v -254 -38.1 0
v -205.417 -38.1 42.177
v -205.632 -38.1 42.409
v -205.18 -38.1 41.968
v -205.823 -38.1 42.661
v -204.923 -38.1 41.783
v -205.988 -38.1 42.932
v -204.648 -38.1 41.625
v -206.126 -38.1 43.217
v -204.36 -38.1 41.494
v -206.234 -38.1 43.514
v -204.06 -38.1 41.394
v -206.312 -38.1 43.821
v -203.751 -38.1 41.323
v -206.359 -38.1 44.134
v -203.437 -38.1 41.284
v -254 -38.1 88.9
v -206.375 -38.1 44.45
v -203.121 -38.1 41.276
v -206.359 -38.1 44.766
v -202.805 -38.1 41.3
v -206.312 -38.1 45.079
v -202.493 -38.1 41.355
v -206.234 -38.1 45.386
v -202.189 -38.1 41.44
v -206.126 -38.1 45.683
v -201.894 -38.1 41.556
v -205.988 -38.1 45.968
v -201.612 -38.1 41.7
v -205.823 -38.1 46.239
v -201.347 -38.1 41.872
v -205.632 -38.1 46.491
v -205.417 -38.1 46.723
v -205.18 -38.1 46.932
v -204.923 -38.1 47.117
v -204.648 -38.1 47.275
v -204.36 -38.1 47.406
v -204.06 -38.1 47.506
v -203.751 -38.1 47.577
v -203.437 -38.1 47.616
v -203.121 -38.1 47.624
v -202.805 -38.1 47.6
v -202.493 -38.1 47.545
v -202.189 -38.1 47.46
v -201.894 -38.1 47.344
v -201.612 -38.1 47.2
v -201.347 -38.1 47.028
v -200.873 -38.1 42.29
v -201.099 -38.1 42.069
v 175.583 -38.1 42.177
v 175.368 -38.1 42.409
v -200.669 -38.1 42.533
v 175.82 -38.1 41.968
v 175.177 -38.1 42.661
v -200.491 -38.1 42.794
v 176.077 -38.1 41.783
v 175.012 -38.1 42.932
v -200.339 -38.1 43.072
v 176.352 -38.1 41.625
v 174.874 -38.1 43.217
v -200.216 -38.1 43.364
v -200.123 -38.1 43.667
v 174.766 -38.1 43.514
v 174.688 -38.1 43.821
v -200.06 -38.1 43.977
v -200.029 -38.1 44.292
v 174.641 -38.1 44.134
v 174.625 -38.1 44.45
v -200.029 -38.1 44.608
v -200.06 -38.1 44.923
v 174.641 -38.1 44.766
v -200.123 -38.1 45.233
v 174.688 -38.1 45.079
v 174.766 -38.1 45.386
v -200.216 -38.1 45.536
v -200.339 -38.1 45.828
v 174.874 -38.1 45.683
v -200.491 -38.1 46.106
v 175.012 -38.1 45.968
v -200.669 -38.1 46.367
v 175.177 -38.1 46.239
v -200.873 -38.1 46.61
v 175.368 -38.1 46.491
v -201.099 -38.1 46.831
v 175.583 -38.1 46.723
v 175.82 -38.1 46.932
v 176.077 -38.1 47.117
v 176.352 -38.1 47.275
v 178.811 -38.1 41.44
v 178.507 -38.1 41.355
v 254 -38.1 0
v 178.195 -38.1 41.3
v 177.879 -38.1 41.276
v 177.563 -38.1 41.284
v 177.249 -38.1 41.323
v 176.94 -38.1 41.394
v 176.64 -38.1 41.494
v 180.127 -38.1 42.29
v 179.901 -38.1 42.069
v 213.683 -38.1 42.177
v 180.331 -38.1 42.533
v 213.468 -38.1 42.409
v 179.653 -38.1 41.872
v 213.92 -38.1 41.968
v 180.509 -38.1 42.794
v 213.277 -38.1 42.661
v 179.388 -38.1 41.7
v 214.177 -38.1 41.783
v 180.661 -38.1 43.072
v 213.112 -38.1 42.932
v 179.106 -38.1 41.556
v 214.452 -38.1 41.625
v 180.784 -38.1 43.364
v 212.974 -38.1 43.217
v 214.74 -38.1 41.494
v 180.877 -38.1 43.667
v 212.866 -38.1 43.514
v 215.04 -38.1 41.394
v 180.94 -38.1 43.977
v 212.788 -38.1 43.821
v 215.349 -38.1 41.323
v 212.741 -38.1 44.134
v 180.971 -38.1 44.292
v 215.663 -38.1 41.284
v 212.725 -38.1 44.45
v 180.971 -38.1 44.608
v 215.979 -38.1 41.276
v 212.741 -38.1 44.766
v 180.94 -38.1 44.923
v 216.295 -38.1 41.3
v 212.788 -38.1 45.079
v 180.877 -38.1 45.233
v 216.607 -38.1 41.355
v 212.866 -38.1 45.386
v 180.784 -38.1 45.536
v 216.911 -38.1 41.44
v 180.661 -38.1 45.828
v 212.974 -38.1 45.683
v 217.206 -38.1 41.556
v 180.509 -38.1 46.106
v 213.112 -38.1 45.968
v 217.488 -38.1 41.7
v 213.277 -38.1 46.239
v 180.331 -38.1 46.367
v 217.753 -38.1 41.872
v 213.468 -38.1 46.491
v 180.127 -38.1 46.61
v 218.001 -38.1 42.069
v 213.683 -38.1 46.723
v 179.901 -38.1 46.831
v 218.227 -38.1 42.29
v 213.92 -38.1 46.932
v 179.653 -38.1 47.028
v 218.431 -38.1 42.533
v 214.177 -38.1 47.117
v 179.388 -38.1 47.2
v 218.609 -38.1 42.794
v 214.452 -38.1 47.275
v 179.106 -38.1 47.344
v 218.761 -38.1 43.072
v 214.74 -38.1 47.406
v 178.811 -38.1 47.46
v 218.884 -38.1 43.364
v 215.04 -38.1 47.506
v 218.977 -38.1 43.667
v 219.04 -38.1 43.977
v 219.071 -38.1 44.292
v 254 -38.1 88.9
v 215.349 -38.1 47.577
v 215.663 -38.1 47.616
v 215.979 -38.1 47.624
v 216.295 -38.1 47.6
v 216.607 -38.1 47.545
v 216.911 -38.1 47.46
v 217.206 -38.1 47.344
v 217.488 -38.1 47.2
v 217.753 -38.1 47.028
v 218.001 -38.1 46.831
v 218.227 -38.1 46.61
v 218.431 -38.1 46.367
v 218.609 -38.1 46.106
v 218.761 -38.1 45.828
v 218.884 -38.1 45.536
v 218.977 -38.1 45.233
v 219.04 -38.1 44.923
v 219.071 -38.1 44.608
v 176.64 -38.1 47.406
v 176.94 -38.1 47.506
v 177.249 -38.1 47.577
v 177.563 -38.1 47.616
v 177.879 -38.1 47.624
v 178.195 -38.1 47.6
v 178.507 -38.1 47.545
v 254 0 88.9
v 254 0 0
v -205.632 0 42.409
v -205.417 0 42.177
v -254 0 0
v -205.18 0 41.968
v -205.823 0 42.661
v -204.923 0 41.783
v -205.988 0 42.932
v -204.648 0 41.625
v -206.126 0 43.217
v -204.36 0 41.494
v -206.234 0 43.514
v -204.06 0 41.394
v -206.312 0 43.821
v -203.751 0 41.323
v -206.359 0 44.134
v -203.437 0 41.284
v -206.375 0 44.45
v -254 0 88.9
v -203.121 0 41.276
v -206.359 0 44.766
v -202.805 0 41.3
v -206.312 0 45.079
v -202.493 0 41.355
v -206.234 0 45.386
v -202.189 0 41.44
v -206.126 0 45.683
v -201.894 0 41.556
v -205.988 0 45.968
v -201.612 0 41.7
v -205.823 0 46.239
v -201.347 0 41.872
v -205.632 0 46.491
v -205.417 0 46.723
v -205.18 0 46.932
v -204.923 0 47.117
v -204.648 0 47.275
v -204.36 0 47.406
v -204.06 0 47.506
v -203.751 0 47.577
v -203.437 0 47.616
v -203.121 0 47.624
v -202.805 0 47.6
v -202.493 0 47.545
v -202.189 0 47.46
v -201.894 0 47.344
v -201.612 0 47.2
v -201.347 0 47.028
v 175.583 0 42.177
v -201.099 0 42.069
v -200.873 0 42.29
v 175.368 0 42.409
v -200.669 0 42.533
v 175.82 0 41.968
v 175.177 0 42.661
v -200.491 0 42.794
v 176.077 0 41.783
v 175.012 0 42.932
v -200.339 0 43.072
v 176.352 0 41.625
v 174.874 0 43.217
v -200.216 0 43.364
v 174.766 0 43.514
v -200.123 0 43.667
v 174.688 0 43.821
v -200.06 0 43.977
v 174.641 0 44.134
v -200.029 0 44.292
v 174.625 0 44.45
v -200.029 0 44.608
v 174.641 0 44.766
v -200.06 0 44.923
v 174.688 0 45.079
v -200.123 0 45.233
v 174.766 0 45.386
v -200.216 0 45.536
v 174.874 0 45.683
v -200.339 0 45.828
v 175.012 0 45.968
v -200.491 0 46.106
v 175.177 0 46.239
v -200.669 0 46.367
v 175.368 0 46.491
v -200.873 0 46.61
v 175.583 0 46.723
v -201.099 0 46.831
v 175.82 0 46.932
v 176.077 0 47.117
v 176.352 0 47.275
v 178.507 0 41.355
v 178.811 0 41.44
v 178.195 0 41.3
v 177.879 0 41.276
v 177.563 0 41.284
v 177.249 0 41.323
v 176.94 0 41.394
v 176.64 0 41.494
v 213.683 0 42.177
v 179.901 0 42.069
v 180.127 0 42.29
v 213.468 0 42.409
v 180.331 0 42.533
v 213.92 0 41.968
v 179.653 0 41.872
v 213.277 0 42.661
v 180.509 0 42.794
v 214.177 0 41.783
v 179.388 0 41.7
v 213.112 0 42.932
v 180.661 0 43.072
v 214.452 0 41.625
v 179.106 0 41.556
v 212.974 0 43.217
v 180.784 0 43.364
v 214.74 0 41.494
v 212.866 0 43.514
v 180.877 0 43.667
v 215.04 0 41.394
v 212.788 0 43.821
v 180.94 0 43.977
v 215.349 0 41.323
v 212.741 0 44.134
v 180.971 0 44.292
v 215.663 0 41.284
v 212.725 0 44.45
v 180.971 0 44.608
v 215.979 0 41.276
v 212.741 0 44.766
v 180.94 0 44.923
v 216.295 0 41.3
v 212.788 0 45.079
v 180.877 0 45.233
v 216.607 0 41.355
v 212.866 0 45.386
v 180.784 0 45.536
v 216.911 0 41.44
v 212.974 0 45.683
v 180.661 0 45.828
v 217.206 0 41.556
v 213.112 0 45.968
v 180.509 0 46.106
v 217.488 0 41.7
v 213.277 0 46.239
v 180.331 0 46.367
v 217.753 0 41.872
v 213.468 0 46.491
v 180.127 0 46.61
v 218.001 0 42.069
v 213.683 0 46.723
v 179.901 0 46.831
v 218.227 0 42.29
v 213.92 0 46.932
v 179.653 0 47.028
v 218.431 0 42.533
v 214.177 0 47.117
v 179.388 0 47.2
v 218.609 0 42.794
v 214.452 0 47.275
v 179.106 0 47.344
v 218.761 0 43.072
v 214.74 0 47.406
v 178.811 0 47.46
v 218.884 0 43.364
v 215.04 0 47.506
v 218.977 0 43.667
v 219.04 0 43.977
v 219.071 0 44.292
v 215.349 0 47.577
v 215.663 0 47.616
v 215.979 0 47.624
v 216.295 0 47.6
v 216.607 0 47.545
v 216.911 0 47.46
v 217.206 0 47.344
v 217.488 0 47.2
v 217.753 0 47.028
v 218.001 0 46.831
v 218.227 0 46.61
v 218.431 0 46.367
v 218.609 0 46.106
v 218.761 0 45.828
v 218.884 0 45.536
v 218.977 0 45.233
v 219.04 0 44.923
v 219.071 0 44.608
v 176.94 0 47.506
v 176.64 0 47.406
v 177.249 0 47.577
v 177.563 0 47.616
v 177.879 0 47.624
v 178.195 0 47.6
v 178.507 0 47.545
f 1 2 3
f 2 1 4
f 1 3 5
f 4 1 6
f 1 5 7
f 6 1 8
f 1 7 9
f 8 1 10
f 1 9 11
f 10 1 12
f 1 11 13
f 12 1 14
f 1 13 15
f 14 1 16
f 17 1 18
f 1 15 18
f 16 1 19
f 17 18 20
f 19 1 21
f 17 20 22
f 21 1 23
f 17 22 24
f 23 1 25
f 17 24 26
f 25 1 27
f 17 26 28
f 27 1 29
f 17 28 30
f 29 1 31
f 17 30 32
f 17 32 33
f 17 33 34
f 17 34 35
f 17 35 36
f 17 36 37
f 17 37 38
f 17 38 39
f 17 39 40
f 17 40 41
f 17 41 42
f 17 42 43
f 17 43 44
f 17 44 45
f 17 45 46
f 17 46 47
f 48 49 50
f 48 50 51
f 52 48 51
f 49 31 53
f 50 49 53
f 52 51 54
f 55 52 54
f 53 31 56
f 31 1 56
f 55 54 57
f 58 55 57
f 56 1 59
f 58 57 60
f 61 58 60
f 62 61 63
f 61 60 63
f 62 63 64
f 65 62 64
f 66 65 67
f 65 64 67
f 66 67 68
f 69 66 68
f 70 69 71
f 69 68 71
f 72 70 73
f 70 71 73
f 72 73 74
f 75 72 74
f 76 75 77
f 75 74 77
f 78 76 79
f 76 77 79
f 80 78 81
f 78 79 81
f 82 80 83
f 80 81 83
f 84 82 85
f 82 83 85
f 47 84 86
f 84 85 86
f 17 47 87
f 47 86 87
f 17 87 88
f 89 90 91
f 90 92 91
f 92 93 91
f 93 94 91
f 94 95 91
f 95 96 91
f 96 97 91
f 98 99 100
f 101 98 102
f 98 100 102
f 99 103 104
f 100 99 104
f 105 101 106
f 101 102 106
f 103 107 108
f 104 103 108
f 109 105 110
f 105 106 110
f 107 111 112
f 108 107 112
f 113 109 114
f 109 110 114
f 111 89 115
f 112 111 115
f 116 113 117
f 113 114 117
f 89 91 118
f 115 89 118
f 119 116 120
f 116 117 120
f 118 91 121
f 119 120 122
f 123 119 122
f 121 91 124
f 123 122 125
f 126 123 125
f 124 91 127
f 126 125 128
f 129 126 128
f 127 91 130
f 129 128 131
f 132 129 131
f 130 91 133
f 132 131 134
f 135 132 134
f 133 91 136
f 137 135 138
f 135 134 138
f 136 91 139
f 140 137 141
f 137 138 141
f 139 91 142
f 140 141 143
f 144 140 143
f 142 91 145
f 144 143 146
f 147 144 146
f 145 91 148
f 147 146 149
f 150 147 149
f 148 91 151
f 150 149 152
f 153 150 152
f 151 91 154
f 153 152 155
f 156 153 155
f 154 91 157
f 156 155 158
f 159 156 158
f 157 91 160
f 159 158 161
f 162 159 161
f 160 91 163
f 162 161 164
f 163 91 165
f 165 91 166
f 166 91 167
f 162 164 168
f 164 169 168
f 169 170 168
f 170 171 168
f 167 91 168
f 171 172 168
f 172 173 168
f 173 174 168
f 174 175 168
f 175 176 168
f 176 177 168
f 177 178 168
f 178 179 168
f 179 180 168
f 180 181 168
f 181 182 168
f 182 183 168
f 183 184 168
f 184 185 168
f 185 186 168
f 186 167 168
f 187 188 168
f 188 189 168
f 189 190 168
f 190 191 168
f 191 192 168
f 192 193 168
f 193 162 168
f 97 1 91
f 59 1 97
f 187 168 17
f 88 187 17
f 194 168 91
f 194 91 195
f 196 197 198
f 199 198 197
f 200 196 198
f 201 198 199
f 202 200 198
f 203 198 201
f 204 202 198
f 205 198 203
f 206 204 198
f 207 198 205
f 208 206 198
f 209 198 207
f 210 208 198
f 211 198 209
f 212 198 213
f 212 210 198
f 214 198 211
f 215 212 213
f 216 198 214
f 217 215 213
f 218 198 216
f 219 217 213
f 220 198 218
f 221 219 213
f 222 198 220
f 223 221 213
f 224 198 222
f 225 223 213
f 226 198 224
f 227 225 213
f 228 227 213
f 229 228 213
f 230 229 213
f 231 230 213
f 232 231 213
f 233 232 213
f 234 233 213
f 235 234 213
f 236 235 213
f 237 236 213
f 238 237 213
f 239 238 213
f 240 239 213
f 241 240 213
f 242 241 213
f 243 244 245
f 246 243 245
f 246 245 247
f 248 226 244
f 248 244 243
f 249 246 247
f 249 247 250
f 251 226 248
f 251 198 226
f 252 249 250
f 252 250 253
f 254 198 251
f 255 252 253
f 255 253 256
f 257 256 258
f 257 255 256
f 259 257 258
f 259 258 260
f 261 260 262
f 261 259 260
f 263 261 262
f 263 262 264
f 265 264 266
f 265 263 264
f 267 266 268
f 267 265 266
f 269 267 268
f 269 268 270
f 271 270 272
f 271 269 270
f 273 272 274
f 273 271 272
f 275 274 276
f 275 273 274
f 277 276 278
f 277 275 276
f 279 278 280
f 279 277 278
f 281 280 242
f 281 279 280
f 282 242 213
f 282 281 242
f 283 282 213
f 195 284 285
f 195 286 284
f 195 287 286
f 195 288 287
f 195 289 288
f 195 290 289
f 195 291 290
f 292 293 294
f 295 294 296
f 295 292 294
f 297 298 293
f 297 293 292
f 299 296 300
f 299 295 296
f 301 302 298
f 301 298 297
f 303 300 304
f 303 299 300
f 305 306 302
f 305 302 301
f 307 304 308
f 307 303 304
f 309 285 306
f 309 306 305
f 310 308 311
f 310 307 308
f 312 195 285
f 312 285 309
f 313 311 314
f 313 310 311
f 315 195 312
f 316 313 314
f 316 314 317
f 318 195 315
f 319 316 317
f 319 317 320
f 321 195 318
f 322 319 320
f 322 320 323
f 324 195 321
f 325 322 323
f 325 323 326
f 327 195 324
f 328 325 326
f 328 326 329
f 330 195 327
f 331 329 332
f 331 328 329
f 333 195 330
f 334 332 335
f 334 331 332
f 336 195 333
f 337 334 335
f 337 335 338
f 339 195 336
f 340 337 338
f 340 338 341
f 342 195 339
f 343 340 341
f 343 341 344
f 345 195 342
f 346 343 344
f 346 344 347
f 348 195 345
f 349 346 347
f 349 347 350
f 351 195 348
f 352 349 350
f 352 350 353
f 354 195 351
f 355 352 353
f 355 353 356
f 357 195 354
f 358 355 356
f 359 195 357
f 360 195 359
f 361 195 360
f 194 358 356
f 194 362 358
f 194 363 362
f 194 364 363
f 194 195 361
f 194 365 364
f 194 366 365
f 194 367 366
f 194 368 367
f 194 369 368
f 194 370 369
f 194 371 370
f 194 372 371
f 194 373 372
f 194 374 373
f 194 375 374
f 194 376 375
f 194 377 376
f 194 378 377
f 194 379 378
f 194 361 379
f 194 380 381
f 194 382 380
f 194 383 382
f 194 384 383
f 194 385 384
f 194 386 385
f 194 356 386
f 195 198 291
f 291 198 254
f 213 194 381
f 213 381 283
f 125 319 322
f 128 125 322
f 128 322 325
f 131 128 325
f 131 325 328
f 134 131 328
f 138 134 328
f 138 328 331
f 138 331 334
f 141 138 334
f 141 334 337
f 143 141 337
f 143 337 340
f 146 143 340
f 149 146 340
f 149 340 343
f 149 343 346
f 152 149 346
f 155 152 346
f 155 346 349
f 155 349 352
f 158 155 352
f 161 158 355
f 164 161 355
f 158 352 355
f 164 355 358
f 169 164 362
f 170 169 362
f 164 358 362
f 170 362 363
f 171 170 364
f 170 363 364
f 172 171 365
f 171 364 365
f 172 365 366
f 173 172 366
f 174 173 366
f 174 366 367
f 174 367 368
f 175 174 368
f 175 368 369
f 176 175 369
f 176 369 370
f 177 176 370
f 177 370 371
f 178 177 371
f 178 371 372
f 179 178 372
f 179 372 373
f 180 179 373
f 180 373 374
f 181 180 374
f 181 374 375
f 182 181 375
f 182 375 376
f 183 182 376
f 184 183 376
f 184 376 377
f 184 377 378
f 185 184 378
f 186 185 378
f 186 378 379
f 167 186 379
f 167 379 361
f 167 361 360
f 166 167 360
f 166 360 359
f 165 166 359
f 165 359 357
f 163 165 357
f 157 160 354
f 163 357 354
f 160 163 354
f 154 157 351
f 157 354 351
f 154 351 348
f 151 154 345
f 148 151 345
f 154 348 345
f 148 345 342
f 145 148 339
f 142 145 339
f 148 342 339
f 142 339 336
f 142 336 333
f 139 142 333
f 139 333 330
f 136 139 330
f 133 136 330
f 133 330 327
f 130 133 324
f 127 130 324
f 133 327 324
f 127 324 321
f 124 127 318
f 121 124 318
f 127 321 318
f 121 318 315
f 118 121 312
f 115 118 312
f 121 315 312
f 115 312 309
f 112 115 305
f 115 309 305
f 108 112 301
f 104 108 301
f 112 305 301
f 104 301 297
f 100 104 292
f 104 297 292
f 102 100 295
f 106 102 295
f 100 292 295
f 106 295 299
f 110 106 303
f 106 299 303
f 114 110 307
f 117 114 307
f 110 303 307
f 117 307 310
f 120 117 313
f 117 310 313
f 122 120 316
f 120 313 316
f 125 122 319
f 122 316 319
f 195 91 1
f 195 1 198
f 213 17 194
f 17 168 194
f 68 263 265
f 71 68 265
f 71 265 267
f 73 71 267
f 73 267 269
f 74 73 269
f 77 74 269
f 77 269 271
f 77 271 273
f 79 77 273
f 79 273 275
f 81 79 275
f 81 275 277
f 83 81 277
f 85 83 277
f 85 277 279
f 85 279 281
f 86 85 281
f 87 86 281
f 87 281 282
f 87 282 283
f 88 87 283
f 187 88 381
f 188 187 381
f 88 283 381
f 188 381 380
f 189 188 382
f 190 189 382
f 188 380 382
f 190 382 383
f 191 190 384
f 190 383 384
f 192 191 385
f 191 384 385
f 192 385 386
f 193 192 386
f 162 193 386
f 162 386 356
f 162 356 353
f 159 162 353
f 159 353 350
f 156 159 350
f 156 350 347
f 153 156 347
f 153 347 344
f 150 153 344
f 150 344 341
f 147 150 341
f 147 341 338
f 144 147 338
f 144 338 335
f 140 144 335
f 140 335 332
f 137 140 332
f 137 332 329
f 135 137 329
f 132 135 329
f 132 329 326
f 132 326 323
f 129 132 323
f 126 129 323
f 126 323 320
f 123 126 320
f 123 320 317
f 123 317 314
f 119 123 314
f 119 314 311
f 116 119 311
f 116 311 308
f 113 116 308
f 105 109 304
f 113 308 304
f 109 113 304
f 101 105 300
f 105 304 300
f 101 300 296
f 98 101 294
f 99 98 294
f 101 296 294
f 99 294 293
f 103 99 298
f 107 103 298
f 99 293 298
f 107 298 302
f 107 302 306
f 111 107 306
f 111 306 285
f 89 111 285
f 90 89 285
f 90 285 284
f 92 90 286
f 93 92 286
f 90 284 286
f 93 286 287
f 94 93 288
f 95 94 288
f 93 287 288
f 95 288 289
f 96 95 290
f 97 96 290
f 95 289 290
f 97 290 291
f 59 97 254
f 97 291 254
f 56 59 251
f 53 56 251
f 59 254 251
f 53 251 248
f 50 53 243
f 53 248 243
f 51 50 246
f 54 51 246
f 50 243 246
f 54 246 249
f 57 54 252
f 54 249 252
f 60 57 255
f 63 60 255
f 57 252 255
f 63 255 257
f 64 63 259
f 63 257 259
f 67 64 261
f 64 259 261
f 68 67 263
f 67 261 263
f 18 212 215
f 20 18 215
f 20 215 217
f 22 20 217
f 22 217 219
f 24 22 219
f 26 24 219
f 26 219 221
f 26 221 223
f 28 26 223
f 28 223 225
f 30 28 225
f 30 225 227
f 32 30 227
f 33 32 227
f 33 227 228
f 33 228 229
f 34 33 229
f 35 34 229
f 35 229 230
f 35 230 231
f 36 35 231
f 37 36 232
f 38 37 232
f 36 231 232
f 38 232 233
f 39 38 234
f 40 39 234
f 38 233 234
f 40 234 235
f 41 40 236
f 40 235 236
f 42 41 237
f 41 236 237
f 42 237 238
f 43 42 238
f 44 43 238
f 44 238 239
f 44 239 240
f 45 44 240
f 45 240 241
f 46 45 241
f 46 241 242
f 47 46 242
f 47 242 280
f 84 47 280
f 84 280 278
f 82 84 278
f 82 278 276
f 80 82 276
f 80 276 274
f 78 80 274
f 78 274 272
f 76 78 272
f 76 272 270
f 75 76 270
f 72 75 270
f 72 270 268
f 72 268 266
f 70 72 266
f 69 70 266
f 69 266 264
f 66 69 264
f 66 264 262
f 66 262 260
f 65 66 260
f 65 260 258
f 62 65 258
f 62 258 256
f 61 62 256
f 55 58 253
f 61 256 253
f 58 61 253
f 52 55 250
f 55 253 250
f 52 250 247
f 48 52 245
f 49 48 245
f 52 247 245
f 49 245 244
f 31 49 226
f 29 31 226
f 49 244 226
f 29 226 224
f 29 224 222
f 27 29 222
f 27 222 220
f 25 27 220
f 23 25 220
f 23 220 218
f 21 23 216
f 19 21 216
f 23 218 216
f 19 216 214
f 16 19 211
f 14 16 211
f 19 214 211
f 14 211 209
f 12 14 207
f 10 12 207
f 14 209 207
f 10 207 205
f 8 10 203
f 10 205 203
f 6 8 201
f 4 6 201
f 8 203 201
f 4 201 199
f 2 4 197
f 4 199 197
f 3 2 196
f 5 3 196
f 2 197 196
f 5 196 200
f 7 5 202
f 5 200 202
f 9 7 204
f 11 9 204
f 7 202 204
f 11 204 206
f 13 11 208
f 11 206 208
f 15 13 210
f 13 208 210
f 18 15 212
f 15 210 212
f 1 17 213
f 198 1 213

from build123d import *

# Parameters (mm, degrees)
F0_W     = 38.1
F0_H     = 88.9
F1_DEPTH = 254
F3_D     = 6.35


with BuildPart() as f1:
    # F0 (on Right) → F1 (new body, symmetric)
    with BuildSketch(Plane.YZ):
        with Locations((-19.05, 44.45)):
            Rectangle(F0_W, F0_H)
    extrude(amount=F1_DEPTH, both=True)

    # F3 (through all)
    with Locations(Plane.XZ.offset(38.1)):
        with Locations((215.9, 44.45), (177.8, 44.45), (-203.2, 44.45)):
            Hole(F3_D / 2)


solid = f1.part
